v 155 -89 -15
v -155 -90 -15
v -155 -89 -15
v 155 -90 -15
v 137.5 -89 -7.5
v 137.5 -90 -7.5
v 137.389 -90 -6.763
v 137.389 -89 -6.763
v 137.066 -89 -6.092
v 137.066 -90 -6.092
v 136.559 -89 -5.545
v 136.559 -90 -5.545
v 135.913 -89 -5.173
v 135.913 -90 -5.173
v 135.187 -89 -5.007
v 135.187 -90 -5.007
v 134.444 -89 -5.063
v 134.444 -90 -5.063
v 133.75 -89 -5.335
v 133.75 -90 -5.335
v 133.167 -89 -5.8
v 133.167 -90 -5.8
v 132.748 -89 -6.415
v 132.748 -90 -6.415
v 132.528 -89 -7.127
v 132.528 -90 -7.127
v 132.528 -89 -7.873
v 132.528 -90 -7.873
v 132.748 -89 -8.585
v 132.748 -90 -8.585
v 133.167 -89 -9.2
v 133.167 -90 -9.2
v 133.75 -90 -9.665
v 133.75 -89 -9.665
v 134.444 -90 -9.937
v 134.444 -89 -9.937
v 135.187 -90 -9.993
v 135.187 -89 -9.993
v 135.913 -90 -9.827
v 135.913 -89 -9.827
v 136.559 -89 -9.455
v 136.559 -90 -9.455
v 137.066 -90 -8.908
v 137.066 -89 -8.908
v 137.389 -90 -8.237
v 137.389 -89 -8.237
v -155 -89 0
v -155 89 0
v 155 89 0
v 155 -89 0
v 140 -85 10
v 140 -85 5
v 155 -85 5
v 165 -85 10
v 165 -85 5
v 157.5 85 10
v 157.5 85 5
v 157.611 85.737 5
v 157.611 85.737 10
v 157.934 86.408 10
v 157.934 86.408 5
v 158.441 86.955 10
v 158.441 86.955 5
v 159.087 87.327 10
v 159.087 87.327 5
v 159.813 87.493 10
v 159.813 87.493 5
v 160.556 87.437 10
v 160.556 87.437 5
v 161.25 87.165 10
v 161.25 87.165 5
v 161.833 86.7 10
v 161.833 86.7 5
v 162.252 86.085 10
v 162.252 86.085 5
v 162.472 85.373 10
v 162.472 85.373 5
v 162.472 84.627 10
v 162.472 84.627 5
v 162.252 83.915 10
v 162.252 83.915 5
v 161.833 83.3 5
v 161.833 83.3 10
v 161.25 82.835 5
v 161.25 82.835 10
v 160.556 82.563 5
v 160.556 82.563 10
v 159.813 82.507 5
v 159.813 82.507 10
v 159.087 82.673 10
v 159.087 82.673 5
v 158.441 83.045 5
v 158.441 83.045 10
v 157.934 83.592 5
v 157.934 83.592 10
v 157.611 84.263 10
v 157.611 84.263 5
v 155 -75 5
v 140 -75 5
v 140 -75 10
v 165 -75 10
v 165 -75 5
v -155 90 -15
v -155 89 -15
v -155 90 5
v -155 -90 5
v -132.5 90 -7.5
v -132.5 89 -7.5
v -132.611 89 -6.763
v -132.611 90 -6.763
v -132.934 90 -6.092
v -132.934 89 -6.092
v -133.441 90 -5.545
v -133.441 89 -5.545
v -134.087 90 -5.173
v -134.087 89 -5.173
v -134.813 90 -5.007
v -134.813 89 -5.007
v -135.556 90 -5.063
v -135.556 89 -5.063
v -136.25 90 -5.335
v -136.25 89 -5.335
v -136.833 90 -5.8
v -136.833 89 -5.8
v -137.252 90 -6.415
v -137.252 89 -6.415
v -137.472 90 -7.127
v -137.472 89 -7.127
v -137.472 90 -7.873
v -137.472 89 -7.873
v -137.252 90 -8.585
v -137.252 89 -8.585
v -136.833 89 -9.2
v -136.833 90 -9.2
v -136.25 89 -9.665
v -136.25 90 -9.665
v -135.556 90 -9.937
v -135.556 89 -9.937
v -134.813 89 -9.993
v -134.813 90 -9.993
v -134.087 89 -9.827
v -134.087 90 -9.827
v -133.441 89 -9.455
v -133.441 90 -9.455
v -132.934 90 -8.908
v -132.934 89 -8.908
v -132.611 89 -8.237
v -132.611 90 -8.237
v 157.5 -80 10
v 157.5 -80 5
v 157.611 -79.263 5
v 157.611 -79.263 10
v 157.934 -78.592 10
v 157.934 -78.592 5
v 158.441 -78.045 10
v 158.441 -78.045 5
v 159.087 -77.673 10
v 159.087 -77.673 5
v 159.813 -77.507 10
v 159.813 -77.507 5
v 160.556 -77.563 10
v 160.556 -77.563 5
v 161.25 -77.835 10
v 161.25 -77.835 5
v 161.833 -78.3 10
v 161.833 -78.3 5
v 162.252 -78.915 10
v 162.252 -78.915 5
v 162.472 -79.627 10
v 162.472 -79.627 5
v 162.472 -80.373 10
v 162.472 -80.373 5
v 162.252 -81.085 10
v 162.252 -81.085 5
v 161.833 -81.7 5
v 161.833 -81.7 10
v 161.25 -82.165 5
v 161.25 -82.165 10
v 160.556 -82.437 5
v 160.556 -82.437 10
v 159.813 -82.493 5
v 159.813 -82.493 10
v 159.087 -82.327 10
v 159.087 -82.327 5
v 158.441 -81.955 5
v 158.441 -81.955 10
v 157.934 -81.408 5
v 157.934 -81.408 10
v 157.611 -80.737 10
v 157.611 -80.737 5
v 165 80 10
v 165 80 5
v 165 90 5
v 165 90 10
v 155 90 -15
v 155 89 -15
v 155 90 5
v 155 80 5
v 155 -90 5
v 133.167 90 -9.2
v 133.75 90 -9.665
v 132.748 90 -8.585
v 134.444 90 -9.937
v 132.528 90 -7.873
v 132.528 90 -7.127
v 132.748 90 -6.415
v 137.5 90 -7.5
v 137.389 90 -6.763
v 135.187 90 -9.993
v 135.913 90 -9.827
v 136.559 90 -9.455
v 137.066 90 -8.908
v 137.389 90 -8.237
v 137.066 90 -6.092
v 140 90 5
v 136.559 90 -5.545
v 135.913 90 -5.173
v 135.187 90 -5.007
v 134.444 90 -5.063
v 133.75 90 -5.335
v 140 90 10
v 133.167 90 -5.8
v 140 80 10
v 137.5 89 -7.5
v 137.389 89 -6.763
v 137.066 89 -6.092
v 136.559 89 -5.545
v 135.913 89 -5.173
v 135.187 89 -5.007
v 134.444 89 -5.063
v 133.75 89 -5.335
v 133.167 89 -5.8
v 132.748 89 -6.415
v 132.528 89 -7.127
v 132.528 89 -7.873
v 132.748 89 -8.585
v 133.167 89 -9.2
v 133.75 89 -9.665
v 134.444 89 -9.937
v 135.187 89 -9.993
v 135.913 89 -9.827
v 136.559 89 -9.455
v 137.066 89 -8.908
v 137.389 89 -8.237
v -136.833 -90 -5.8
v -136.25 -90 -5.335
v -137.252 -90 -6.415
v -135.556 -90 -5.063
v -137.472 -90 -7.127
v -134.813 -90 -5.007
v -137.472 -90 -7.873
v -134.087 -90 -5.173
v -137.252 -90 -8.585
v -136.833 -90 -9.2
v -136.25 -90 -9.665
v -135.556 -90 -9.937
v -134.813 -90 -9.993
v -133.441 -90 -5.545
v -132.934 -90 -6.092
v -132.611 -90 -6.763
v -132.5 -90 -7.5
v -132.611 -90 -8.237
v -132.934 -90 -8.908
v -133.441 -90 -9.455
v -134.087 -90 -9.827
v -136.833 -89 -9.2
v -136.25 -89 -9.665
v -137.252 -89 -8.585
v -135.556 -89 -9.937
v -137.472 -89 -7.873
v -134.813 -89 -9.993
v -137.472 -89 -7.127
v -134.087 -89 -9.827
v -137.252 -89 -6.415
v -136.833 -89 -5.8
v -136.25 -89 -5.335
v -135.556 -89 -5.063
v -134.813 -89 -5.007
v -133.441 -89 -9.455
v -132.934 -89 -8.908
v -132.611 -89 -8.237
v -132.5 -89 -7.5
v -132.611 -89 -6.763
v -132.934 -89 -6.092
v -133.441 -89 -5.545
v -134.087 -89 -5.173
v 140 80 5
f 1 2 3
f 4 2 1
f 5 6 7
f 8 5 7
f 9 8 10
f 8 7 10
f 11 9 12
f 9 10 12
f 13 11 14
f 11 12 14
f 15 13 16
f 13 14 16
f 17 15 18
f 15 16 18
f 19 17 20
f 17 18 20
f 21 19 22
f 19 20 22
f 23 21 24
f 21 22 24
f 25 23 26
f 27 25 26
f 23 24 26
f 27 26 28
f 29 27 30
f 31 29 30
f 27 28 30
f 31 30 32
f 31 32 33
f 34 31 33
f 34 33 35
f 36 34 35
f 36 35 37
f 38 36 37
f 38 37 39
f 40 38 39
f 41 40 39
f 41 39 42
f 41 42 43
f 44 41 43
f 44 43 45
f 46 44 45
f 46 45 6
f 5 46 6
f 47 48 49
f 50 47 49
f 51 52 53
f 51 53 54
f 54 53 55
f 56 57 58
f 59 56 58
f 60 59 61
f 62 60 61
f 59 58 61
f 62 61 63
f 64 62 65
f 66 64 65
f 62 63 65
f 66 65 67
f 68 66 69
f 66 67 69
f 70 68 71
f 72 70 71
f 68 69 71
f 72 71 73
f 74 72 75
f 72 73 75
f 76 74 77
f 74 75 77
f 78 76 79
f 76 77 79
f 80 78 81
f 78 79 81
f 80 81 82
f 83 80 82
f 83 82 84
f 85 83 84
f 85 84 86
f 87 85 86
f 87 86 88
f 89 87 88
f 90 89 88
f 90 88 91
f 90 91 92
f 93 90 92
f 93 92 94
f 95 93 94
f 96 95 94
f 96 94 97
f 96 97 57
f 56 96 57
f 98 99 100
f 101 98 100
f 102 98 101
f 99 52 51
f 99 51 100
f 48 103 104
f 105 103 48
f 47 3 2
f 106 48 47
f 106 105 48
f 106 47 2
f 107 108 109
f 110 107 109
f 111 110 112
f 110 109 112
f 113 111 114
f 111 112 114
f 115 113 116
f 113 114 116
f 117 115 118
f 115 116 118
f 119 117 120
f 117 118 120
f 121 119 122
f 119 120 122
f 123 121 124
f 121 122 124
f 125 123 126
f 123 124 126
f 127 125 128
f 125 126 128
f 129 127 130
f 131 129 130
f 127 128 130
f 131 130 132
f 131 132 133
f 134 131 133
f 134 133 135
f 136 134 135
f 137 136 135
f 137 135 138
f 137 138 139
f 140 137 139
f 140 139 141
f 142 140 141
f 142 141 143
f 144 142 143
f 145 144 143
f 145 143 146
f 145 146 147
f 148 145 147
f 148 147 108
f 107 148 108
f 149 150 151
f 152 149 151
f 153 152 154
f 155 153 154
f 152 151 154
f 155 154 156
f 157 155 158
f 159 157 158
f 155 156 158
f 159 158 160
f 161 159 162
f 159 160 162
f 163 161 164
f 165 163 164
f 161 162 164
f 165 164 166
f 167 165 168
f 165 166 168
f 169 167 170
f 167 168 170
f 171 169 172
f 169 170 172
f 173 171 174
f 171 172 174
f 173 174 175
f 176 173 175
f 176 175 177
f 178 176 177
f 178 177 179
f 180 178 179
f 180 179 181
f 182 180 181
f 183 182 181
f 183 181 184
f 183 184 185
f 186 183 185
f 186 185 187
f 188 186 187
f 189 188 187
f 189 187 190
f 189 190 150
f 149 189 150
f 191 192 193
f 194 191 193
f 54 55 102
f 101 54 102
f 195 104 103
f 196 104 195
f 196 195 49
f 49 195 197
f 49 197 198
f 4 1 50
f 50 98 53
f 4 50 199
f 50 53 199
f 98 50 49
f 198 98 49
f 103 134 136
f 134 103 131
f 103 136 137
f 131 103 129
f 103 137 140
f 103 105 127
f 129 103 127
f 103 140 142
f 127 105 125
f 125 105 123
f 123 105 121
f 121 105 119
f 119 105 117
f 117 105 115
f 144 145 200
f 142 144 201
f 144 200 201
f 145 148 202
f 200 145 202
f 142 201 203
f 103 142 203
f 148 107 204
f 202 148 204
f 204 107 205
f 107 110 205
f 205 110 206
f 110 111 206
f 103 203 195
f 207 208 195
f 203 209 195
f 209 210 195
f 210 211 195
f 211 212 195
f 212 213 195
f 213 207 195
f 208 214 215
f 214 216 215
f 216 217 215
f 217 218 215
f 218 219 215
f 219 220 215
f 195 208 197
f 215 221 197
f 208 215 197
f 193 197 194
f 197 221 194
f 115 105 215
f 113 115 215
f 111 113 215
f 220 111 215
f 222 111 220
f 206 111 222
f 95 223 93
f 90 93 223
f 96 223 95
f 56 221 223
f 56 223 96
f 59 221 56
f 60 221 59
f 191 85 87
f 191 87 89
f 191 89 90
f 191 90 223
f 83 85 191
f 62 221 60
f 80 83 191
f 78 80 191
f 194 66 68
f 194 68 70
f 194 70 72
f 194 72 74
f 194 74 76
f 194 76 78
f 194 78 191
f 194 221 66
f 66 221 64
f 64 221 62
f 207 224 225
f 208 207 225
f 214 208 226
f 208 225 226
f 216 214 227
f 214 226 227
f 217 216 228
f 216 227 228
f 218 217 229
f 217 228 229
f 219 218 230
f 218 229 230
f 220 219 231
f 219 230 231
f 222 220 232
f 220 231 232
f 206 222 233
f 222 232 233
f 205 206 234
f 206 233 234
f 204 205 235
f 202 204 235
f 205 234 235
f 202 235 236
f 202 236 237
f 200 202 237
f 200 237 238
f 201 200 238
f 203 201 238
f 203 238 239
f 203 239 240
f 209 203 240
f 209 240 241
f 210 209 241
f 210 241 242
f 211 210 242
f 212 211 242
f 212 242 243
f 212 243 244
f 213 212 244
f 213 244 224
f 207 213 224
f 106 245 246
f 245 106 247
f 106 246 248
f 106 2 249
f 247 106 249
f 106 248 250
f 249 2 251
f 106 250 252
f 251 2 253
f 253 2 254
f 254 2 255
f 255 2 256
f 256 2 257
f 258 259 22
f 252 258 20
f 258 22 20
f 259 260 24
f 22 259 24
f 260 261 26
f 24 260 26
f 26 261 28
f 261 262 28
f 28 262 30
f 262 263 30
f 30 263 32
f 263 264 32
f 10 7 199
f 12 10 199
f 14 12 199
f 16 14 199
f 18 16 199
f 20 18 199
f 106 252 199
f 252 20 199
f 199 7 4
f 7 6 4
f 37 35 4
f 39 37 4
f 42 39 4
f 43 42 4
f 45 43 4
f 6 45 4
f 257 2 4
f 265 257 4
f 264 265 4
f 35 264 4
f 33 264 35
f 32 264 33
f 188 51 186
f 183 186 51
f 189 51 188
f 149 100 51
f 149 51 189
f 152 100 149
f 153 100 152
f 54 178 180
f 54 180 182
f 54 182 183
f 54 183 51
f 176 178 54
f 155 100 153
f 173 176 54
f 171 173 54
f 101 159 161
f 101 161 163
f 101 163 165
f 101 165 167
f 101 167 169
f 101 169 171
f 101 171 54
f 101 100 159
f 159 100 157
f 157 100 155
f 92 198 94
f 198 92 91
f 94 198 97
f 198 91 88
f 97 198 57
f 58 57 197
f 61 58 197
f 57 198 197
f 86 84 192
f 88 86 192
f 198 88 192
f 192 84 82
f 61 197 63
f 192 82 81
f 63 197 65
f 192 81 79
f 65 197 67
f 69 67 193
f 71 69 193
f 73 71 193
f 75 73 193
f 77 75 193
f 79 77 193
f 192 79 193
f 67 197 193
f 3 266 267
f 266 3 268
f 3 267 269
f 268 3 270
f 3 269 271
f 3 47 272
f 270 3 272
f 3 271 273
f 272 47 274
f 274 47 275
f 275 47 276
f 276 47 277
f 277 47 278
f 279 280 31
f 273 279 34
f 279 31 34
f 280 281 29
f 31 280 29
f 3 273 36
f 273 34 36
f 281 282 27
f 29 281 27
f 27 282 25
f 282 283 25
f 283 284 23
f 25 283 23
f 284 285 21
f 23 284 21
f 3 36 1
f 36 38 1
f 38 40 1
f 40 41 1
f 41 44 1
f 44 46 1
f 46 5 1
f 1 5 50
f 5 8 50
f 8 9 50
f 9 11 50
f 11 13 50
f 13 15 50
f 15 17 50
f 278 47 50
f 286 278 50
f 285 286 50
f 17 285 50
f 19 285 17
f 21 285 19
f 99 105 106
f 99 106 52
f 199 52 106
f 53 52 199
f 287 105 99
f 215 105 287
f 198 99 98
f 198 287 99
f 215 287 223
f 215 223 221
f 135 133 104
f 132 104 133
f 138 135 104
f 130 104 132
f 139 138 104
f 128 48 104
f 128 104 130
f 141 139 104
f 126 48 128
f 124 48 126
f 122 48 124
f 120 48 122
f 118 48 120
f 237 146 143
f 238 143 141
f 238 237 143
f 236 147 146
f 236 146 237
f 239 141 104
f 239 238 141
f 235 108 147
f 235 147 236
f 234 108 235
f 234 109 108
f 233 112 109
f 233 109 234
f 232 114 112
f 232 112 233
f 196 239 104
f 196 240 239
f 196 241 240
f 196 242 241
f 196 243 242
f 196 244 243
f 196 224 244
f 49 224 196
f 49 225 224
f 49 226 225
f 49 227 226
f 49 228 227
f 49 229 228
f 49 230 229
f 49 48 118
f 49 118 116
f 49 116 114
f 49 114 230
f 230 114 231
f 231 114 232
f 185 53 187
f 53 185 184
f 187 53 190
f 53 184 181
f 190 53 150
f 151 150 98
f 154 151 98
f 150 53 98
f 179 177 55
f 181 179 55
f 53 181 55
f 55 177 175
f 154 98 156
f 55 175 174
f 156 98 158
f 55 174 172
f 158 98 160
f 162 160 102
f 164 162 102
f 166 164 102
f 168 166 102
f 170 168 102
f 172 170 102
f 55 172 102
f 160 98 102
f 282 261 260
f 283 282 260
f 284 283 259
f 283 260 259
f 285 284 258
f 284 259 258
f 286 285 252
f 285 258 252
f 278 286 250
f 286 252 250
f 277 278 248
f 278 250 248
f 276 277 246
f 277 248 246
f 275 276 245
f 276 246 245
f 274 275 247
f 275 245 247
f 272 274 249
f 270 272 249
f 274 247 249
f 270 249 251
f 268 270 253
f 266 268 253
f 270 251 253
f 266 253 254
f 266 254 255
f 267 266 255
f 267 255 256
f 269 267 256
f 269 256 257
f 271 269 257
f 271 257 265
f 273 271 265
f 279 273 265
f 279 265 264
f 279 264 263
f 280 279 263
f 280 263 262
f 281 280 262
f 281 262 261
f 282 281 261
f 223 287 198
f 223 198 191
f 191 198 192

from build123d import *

# Parameters (mm, degrees)
F0_W      = 310
F0_H      = 180
F1_DEPTH  = 5
F2_W      = 25
F2_H      = 10
F3_DEPTH  = 5
F5_D      = 5
F6_W      = 25
F6_H      = 10
F7_DEPTH  = 5
F9_D      = 5
F10_W     = 310
F10_H     = 1
F11_DEPTH = 15
F13_D     = 5
F15_D     = 5


with BuildPart() as f1:
    # F0 (on Top) → F1 (new body)
    with BuildSketch(Plane.XY):
        Rectangle(F0_W, F0_H)
    extrude(amount=F1_DEPTH)

    # F2 (on face) → F3 (join)
    with BuildSketch(Plane.XY.offset(5)):
        with Locations((152.5, 85)):
            Rectangle(F2_W, F2_H)
    extrude(amount=F3_DEPTH)

    # F5 (through all)
    with Locations(Plane.XY.offset(10)):
        with Locations((160, 85)):
            Hole(F5_D / 2)

    # F6 (on face) → F7 (join)
    with BuildSketch(Plane.XY.offset(5)):
        with Locations((152.5, -80)):
            Rectangle(F6_W, F6_H)
    extrude(amount=F7_DEPTH)

    # F9 (through all)
    with Locations(Plane.XY.offset(10)):
        with Locations((160, -80)):
            Hole(F9_D / 2)

    # F10 (on face) → F11 (join)
    with BuildSketch(Plane(origin=(0, 0, 0), x_dir=(1, 0, 0), z_dir=(0, 0, -1))):
        with Locations((0, -89.5)):
            Rectangle(F10_W, F10_H)
        with Locations((0, 89.5)):
            Rectangle(F10_W, F10_H)
    extrude(amount=F11_DEPTH)

    # F13 (through all)
    with Locations(Plane(origin=(0, 90, 0), x_dir=(-1, 0, 0), z_dir=(0, 1, 0))):
        with Locations((-135, -7.5)):
            Hole(F13_D / 2)

    # F15 (through all)
    with Locations(Plane(origin=(0, 90, 0), x_dir=(-1, 0, 0), z_dir=(0, 1, 0))):
        with Locations((135, -7.5)):
            Hole(F15_D / 2)


solid = f1.part
